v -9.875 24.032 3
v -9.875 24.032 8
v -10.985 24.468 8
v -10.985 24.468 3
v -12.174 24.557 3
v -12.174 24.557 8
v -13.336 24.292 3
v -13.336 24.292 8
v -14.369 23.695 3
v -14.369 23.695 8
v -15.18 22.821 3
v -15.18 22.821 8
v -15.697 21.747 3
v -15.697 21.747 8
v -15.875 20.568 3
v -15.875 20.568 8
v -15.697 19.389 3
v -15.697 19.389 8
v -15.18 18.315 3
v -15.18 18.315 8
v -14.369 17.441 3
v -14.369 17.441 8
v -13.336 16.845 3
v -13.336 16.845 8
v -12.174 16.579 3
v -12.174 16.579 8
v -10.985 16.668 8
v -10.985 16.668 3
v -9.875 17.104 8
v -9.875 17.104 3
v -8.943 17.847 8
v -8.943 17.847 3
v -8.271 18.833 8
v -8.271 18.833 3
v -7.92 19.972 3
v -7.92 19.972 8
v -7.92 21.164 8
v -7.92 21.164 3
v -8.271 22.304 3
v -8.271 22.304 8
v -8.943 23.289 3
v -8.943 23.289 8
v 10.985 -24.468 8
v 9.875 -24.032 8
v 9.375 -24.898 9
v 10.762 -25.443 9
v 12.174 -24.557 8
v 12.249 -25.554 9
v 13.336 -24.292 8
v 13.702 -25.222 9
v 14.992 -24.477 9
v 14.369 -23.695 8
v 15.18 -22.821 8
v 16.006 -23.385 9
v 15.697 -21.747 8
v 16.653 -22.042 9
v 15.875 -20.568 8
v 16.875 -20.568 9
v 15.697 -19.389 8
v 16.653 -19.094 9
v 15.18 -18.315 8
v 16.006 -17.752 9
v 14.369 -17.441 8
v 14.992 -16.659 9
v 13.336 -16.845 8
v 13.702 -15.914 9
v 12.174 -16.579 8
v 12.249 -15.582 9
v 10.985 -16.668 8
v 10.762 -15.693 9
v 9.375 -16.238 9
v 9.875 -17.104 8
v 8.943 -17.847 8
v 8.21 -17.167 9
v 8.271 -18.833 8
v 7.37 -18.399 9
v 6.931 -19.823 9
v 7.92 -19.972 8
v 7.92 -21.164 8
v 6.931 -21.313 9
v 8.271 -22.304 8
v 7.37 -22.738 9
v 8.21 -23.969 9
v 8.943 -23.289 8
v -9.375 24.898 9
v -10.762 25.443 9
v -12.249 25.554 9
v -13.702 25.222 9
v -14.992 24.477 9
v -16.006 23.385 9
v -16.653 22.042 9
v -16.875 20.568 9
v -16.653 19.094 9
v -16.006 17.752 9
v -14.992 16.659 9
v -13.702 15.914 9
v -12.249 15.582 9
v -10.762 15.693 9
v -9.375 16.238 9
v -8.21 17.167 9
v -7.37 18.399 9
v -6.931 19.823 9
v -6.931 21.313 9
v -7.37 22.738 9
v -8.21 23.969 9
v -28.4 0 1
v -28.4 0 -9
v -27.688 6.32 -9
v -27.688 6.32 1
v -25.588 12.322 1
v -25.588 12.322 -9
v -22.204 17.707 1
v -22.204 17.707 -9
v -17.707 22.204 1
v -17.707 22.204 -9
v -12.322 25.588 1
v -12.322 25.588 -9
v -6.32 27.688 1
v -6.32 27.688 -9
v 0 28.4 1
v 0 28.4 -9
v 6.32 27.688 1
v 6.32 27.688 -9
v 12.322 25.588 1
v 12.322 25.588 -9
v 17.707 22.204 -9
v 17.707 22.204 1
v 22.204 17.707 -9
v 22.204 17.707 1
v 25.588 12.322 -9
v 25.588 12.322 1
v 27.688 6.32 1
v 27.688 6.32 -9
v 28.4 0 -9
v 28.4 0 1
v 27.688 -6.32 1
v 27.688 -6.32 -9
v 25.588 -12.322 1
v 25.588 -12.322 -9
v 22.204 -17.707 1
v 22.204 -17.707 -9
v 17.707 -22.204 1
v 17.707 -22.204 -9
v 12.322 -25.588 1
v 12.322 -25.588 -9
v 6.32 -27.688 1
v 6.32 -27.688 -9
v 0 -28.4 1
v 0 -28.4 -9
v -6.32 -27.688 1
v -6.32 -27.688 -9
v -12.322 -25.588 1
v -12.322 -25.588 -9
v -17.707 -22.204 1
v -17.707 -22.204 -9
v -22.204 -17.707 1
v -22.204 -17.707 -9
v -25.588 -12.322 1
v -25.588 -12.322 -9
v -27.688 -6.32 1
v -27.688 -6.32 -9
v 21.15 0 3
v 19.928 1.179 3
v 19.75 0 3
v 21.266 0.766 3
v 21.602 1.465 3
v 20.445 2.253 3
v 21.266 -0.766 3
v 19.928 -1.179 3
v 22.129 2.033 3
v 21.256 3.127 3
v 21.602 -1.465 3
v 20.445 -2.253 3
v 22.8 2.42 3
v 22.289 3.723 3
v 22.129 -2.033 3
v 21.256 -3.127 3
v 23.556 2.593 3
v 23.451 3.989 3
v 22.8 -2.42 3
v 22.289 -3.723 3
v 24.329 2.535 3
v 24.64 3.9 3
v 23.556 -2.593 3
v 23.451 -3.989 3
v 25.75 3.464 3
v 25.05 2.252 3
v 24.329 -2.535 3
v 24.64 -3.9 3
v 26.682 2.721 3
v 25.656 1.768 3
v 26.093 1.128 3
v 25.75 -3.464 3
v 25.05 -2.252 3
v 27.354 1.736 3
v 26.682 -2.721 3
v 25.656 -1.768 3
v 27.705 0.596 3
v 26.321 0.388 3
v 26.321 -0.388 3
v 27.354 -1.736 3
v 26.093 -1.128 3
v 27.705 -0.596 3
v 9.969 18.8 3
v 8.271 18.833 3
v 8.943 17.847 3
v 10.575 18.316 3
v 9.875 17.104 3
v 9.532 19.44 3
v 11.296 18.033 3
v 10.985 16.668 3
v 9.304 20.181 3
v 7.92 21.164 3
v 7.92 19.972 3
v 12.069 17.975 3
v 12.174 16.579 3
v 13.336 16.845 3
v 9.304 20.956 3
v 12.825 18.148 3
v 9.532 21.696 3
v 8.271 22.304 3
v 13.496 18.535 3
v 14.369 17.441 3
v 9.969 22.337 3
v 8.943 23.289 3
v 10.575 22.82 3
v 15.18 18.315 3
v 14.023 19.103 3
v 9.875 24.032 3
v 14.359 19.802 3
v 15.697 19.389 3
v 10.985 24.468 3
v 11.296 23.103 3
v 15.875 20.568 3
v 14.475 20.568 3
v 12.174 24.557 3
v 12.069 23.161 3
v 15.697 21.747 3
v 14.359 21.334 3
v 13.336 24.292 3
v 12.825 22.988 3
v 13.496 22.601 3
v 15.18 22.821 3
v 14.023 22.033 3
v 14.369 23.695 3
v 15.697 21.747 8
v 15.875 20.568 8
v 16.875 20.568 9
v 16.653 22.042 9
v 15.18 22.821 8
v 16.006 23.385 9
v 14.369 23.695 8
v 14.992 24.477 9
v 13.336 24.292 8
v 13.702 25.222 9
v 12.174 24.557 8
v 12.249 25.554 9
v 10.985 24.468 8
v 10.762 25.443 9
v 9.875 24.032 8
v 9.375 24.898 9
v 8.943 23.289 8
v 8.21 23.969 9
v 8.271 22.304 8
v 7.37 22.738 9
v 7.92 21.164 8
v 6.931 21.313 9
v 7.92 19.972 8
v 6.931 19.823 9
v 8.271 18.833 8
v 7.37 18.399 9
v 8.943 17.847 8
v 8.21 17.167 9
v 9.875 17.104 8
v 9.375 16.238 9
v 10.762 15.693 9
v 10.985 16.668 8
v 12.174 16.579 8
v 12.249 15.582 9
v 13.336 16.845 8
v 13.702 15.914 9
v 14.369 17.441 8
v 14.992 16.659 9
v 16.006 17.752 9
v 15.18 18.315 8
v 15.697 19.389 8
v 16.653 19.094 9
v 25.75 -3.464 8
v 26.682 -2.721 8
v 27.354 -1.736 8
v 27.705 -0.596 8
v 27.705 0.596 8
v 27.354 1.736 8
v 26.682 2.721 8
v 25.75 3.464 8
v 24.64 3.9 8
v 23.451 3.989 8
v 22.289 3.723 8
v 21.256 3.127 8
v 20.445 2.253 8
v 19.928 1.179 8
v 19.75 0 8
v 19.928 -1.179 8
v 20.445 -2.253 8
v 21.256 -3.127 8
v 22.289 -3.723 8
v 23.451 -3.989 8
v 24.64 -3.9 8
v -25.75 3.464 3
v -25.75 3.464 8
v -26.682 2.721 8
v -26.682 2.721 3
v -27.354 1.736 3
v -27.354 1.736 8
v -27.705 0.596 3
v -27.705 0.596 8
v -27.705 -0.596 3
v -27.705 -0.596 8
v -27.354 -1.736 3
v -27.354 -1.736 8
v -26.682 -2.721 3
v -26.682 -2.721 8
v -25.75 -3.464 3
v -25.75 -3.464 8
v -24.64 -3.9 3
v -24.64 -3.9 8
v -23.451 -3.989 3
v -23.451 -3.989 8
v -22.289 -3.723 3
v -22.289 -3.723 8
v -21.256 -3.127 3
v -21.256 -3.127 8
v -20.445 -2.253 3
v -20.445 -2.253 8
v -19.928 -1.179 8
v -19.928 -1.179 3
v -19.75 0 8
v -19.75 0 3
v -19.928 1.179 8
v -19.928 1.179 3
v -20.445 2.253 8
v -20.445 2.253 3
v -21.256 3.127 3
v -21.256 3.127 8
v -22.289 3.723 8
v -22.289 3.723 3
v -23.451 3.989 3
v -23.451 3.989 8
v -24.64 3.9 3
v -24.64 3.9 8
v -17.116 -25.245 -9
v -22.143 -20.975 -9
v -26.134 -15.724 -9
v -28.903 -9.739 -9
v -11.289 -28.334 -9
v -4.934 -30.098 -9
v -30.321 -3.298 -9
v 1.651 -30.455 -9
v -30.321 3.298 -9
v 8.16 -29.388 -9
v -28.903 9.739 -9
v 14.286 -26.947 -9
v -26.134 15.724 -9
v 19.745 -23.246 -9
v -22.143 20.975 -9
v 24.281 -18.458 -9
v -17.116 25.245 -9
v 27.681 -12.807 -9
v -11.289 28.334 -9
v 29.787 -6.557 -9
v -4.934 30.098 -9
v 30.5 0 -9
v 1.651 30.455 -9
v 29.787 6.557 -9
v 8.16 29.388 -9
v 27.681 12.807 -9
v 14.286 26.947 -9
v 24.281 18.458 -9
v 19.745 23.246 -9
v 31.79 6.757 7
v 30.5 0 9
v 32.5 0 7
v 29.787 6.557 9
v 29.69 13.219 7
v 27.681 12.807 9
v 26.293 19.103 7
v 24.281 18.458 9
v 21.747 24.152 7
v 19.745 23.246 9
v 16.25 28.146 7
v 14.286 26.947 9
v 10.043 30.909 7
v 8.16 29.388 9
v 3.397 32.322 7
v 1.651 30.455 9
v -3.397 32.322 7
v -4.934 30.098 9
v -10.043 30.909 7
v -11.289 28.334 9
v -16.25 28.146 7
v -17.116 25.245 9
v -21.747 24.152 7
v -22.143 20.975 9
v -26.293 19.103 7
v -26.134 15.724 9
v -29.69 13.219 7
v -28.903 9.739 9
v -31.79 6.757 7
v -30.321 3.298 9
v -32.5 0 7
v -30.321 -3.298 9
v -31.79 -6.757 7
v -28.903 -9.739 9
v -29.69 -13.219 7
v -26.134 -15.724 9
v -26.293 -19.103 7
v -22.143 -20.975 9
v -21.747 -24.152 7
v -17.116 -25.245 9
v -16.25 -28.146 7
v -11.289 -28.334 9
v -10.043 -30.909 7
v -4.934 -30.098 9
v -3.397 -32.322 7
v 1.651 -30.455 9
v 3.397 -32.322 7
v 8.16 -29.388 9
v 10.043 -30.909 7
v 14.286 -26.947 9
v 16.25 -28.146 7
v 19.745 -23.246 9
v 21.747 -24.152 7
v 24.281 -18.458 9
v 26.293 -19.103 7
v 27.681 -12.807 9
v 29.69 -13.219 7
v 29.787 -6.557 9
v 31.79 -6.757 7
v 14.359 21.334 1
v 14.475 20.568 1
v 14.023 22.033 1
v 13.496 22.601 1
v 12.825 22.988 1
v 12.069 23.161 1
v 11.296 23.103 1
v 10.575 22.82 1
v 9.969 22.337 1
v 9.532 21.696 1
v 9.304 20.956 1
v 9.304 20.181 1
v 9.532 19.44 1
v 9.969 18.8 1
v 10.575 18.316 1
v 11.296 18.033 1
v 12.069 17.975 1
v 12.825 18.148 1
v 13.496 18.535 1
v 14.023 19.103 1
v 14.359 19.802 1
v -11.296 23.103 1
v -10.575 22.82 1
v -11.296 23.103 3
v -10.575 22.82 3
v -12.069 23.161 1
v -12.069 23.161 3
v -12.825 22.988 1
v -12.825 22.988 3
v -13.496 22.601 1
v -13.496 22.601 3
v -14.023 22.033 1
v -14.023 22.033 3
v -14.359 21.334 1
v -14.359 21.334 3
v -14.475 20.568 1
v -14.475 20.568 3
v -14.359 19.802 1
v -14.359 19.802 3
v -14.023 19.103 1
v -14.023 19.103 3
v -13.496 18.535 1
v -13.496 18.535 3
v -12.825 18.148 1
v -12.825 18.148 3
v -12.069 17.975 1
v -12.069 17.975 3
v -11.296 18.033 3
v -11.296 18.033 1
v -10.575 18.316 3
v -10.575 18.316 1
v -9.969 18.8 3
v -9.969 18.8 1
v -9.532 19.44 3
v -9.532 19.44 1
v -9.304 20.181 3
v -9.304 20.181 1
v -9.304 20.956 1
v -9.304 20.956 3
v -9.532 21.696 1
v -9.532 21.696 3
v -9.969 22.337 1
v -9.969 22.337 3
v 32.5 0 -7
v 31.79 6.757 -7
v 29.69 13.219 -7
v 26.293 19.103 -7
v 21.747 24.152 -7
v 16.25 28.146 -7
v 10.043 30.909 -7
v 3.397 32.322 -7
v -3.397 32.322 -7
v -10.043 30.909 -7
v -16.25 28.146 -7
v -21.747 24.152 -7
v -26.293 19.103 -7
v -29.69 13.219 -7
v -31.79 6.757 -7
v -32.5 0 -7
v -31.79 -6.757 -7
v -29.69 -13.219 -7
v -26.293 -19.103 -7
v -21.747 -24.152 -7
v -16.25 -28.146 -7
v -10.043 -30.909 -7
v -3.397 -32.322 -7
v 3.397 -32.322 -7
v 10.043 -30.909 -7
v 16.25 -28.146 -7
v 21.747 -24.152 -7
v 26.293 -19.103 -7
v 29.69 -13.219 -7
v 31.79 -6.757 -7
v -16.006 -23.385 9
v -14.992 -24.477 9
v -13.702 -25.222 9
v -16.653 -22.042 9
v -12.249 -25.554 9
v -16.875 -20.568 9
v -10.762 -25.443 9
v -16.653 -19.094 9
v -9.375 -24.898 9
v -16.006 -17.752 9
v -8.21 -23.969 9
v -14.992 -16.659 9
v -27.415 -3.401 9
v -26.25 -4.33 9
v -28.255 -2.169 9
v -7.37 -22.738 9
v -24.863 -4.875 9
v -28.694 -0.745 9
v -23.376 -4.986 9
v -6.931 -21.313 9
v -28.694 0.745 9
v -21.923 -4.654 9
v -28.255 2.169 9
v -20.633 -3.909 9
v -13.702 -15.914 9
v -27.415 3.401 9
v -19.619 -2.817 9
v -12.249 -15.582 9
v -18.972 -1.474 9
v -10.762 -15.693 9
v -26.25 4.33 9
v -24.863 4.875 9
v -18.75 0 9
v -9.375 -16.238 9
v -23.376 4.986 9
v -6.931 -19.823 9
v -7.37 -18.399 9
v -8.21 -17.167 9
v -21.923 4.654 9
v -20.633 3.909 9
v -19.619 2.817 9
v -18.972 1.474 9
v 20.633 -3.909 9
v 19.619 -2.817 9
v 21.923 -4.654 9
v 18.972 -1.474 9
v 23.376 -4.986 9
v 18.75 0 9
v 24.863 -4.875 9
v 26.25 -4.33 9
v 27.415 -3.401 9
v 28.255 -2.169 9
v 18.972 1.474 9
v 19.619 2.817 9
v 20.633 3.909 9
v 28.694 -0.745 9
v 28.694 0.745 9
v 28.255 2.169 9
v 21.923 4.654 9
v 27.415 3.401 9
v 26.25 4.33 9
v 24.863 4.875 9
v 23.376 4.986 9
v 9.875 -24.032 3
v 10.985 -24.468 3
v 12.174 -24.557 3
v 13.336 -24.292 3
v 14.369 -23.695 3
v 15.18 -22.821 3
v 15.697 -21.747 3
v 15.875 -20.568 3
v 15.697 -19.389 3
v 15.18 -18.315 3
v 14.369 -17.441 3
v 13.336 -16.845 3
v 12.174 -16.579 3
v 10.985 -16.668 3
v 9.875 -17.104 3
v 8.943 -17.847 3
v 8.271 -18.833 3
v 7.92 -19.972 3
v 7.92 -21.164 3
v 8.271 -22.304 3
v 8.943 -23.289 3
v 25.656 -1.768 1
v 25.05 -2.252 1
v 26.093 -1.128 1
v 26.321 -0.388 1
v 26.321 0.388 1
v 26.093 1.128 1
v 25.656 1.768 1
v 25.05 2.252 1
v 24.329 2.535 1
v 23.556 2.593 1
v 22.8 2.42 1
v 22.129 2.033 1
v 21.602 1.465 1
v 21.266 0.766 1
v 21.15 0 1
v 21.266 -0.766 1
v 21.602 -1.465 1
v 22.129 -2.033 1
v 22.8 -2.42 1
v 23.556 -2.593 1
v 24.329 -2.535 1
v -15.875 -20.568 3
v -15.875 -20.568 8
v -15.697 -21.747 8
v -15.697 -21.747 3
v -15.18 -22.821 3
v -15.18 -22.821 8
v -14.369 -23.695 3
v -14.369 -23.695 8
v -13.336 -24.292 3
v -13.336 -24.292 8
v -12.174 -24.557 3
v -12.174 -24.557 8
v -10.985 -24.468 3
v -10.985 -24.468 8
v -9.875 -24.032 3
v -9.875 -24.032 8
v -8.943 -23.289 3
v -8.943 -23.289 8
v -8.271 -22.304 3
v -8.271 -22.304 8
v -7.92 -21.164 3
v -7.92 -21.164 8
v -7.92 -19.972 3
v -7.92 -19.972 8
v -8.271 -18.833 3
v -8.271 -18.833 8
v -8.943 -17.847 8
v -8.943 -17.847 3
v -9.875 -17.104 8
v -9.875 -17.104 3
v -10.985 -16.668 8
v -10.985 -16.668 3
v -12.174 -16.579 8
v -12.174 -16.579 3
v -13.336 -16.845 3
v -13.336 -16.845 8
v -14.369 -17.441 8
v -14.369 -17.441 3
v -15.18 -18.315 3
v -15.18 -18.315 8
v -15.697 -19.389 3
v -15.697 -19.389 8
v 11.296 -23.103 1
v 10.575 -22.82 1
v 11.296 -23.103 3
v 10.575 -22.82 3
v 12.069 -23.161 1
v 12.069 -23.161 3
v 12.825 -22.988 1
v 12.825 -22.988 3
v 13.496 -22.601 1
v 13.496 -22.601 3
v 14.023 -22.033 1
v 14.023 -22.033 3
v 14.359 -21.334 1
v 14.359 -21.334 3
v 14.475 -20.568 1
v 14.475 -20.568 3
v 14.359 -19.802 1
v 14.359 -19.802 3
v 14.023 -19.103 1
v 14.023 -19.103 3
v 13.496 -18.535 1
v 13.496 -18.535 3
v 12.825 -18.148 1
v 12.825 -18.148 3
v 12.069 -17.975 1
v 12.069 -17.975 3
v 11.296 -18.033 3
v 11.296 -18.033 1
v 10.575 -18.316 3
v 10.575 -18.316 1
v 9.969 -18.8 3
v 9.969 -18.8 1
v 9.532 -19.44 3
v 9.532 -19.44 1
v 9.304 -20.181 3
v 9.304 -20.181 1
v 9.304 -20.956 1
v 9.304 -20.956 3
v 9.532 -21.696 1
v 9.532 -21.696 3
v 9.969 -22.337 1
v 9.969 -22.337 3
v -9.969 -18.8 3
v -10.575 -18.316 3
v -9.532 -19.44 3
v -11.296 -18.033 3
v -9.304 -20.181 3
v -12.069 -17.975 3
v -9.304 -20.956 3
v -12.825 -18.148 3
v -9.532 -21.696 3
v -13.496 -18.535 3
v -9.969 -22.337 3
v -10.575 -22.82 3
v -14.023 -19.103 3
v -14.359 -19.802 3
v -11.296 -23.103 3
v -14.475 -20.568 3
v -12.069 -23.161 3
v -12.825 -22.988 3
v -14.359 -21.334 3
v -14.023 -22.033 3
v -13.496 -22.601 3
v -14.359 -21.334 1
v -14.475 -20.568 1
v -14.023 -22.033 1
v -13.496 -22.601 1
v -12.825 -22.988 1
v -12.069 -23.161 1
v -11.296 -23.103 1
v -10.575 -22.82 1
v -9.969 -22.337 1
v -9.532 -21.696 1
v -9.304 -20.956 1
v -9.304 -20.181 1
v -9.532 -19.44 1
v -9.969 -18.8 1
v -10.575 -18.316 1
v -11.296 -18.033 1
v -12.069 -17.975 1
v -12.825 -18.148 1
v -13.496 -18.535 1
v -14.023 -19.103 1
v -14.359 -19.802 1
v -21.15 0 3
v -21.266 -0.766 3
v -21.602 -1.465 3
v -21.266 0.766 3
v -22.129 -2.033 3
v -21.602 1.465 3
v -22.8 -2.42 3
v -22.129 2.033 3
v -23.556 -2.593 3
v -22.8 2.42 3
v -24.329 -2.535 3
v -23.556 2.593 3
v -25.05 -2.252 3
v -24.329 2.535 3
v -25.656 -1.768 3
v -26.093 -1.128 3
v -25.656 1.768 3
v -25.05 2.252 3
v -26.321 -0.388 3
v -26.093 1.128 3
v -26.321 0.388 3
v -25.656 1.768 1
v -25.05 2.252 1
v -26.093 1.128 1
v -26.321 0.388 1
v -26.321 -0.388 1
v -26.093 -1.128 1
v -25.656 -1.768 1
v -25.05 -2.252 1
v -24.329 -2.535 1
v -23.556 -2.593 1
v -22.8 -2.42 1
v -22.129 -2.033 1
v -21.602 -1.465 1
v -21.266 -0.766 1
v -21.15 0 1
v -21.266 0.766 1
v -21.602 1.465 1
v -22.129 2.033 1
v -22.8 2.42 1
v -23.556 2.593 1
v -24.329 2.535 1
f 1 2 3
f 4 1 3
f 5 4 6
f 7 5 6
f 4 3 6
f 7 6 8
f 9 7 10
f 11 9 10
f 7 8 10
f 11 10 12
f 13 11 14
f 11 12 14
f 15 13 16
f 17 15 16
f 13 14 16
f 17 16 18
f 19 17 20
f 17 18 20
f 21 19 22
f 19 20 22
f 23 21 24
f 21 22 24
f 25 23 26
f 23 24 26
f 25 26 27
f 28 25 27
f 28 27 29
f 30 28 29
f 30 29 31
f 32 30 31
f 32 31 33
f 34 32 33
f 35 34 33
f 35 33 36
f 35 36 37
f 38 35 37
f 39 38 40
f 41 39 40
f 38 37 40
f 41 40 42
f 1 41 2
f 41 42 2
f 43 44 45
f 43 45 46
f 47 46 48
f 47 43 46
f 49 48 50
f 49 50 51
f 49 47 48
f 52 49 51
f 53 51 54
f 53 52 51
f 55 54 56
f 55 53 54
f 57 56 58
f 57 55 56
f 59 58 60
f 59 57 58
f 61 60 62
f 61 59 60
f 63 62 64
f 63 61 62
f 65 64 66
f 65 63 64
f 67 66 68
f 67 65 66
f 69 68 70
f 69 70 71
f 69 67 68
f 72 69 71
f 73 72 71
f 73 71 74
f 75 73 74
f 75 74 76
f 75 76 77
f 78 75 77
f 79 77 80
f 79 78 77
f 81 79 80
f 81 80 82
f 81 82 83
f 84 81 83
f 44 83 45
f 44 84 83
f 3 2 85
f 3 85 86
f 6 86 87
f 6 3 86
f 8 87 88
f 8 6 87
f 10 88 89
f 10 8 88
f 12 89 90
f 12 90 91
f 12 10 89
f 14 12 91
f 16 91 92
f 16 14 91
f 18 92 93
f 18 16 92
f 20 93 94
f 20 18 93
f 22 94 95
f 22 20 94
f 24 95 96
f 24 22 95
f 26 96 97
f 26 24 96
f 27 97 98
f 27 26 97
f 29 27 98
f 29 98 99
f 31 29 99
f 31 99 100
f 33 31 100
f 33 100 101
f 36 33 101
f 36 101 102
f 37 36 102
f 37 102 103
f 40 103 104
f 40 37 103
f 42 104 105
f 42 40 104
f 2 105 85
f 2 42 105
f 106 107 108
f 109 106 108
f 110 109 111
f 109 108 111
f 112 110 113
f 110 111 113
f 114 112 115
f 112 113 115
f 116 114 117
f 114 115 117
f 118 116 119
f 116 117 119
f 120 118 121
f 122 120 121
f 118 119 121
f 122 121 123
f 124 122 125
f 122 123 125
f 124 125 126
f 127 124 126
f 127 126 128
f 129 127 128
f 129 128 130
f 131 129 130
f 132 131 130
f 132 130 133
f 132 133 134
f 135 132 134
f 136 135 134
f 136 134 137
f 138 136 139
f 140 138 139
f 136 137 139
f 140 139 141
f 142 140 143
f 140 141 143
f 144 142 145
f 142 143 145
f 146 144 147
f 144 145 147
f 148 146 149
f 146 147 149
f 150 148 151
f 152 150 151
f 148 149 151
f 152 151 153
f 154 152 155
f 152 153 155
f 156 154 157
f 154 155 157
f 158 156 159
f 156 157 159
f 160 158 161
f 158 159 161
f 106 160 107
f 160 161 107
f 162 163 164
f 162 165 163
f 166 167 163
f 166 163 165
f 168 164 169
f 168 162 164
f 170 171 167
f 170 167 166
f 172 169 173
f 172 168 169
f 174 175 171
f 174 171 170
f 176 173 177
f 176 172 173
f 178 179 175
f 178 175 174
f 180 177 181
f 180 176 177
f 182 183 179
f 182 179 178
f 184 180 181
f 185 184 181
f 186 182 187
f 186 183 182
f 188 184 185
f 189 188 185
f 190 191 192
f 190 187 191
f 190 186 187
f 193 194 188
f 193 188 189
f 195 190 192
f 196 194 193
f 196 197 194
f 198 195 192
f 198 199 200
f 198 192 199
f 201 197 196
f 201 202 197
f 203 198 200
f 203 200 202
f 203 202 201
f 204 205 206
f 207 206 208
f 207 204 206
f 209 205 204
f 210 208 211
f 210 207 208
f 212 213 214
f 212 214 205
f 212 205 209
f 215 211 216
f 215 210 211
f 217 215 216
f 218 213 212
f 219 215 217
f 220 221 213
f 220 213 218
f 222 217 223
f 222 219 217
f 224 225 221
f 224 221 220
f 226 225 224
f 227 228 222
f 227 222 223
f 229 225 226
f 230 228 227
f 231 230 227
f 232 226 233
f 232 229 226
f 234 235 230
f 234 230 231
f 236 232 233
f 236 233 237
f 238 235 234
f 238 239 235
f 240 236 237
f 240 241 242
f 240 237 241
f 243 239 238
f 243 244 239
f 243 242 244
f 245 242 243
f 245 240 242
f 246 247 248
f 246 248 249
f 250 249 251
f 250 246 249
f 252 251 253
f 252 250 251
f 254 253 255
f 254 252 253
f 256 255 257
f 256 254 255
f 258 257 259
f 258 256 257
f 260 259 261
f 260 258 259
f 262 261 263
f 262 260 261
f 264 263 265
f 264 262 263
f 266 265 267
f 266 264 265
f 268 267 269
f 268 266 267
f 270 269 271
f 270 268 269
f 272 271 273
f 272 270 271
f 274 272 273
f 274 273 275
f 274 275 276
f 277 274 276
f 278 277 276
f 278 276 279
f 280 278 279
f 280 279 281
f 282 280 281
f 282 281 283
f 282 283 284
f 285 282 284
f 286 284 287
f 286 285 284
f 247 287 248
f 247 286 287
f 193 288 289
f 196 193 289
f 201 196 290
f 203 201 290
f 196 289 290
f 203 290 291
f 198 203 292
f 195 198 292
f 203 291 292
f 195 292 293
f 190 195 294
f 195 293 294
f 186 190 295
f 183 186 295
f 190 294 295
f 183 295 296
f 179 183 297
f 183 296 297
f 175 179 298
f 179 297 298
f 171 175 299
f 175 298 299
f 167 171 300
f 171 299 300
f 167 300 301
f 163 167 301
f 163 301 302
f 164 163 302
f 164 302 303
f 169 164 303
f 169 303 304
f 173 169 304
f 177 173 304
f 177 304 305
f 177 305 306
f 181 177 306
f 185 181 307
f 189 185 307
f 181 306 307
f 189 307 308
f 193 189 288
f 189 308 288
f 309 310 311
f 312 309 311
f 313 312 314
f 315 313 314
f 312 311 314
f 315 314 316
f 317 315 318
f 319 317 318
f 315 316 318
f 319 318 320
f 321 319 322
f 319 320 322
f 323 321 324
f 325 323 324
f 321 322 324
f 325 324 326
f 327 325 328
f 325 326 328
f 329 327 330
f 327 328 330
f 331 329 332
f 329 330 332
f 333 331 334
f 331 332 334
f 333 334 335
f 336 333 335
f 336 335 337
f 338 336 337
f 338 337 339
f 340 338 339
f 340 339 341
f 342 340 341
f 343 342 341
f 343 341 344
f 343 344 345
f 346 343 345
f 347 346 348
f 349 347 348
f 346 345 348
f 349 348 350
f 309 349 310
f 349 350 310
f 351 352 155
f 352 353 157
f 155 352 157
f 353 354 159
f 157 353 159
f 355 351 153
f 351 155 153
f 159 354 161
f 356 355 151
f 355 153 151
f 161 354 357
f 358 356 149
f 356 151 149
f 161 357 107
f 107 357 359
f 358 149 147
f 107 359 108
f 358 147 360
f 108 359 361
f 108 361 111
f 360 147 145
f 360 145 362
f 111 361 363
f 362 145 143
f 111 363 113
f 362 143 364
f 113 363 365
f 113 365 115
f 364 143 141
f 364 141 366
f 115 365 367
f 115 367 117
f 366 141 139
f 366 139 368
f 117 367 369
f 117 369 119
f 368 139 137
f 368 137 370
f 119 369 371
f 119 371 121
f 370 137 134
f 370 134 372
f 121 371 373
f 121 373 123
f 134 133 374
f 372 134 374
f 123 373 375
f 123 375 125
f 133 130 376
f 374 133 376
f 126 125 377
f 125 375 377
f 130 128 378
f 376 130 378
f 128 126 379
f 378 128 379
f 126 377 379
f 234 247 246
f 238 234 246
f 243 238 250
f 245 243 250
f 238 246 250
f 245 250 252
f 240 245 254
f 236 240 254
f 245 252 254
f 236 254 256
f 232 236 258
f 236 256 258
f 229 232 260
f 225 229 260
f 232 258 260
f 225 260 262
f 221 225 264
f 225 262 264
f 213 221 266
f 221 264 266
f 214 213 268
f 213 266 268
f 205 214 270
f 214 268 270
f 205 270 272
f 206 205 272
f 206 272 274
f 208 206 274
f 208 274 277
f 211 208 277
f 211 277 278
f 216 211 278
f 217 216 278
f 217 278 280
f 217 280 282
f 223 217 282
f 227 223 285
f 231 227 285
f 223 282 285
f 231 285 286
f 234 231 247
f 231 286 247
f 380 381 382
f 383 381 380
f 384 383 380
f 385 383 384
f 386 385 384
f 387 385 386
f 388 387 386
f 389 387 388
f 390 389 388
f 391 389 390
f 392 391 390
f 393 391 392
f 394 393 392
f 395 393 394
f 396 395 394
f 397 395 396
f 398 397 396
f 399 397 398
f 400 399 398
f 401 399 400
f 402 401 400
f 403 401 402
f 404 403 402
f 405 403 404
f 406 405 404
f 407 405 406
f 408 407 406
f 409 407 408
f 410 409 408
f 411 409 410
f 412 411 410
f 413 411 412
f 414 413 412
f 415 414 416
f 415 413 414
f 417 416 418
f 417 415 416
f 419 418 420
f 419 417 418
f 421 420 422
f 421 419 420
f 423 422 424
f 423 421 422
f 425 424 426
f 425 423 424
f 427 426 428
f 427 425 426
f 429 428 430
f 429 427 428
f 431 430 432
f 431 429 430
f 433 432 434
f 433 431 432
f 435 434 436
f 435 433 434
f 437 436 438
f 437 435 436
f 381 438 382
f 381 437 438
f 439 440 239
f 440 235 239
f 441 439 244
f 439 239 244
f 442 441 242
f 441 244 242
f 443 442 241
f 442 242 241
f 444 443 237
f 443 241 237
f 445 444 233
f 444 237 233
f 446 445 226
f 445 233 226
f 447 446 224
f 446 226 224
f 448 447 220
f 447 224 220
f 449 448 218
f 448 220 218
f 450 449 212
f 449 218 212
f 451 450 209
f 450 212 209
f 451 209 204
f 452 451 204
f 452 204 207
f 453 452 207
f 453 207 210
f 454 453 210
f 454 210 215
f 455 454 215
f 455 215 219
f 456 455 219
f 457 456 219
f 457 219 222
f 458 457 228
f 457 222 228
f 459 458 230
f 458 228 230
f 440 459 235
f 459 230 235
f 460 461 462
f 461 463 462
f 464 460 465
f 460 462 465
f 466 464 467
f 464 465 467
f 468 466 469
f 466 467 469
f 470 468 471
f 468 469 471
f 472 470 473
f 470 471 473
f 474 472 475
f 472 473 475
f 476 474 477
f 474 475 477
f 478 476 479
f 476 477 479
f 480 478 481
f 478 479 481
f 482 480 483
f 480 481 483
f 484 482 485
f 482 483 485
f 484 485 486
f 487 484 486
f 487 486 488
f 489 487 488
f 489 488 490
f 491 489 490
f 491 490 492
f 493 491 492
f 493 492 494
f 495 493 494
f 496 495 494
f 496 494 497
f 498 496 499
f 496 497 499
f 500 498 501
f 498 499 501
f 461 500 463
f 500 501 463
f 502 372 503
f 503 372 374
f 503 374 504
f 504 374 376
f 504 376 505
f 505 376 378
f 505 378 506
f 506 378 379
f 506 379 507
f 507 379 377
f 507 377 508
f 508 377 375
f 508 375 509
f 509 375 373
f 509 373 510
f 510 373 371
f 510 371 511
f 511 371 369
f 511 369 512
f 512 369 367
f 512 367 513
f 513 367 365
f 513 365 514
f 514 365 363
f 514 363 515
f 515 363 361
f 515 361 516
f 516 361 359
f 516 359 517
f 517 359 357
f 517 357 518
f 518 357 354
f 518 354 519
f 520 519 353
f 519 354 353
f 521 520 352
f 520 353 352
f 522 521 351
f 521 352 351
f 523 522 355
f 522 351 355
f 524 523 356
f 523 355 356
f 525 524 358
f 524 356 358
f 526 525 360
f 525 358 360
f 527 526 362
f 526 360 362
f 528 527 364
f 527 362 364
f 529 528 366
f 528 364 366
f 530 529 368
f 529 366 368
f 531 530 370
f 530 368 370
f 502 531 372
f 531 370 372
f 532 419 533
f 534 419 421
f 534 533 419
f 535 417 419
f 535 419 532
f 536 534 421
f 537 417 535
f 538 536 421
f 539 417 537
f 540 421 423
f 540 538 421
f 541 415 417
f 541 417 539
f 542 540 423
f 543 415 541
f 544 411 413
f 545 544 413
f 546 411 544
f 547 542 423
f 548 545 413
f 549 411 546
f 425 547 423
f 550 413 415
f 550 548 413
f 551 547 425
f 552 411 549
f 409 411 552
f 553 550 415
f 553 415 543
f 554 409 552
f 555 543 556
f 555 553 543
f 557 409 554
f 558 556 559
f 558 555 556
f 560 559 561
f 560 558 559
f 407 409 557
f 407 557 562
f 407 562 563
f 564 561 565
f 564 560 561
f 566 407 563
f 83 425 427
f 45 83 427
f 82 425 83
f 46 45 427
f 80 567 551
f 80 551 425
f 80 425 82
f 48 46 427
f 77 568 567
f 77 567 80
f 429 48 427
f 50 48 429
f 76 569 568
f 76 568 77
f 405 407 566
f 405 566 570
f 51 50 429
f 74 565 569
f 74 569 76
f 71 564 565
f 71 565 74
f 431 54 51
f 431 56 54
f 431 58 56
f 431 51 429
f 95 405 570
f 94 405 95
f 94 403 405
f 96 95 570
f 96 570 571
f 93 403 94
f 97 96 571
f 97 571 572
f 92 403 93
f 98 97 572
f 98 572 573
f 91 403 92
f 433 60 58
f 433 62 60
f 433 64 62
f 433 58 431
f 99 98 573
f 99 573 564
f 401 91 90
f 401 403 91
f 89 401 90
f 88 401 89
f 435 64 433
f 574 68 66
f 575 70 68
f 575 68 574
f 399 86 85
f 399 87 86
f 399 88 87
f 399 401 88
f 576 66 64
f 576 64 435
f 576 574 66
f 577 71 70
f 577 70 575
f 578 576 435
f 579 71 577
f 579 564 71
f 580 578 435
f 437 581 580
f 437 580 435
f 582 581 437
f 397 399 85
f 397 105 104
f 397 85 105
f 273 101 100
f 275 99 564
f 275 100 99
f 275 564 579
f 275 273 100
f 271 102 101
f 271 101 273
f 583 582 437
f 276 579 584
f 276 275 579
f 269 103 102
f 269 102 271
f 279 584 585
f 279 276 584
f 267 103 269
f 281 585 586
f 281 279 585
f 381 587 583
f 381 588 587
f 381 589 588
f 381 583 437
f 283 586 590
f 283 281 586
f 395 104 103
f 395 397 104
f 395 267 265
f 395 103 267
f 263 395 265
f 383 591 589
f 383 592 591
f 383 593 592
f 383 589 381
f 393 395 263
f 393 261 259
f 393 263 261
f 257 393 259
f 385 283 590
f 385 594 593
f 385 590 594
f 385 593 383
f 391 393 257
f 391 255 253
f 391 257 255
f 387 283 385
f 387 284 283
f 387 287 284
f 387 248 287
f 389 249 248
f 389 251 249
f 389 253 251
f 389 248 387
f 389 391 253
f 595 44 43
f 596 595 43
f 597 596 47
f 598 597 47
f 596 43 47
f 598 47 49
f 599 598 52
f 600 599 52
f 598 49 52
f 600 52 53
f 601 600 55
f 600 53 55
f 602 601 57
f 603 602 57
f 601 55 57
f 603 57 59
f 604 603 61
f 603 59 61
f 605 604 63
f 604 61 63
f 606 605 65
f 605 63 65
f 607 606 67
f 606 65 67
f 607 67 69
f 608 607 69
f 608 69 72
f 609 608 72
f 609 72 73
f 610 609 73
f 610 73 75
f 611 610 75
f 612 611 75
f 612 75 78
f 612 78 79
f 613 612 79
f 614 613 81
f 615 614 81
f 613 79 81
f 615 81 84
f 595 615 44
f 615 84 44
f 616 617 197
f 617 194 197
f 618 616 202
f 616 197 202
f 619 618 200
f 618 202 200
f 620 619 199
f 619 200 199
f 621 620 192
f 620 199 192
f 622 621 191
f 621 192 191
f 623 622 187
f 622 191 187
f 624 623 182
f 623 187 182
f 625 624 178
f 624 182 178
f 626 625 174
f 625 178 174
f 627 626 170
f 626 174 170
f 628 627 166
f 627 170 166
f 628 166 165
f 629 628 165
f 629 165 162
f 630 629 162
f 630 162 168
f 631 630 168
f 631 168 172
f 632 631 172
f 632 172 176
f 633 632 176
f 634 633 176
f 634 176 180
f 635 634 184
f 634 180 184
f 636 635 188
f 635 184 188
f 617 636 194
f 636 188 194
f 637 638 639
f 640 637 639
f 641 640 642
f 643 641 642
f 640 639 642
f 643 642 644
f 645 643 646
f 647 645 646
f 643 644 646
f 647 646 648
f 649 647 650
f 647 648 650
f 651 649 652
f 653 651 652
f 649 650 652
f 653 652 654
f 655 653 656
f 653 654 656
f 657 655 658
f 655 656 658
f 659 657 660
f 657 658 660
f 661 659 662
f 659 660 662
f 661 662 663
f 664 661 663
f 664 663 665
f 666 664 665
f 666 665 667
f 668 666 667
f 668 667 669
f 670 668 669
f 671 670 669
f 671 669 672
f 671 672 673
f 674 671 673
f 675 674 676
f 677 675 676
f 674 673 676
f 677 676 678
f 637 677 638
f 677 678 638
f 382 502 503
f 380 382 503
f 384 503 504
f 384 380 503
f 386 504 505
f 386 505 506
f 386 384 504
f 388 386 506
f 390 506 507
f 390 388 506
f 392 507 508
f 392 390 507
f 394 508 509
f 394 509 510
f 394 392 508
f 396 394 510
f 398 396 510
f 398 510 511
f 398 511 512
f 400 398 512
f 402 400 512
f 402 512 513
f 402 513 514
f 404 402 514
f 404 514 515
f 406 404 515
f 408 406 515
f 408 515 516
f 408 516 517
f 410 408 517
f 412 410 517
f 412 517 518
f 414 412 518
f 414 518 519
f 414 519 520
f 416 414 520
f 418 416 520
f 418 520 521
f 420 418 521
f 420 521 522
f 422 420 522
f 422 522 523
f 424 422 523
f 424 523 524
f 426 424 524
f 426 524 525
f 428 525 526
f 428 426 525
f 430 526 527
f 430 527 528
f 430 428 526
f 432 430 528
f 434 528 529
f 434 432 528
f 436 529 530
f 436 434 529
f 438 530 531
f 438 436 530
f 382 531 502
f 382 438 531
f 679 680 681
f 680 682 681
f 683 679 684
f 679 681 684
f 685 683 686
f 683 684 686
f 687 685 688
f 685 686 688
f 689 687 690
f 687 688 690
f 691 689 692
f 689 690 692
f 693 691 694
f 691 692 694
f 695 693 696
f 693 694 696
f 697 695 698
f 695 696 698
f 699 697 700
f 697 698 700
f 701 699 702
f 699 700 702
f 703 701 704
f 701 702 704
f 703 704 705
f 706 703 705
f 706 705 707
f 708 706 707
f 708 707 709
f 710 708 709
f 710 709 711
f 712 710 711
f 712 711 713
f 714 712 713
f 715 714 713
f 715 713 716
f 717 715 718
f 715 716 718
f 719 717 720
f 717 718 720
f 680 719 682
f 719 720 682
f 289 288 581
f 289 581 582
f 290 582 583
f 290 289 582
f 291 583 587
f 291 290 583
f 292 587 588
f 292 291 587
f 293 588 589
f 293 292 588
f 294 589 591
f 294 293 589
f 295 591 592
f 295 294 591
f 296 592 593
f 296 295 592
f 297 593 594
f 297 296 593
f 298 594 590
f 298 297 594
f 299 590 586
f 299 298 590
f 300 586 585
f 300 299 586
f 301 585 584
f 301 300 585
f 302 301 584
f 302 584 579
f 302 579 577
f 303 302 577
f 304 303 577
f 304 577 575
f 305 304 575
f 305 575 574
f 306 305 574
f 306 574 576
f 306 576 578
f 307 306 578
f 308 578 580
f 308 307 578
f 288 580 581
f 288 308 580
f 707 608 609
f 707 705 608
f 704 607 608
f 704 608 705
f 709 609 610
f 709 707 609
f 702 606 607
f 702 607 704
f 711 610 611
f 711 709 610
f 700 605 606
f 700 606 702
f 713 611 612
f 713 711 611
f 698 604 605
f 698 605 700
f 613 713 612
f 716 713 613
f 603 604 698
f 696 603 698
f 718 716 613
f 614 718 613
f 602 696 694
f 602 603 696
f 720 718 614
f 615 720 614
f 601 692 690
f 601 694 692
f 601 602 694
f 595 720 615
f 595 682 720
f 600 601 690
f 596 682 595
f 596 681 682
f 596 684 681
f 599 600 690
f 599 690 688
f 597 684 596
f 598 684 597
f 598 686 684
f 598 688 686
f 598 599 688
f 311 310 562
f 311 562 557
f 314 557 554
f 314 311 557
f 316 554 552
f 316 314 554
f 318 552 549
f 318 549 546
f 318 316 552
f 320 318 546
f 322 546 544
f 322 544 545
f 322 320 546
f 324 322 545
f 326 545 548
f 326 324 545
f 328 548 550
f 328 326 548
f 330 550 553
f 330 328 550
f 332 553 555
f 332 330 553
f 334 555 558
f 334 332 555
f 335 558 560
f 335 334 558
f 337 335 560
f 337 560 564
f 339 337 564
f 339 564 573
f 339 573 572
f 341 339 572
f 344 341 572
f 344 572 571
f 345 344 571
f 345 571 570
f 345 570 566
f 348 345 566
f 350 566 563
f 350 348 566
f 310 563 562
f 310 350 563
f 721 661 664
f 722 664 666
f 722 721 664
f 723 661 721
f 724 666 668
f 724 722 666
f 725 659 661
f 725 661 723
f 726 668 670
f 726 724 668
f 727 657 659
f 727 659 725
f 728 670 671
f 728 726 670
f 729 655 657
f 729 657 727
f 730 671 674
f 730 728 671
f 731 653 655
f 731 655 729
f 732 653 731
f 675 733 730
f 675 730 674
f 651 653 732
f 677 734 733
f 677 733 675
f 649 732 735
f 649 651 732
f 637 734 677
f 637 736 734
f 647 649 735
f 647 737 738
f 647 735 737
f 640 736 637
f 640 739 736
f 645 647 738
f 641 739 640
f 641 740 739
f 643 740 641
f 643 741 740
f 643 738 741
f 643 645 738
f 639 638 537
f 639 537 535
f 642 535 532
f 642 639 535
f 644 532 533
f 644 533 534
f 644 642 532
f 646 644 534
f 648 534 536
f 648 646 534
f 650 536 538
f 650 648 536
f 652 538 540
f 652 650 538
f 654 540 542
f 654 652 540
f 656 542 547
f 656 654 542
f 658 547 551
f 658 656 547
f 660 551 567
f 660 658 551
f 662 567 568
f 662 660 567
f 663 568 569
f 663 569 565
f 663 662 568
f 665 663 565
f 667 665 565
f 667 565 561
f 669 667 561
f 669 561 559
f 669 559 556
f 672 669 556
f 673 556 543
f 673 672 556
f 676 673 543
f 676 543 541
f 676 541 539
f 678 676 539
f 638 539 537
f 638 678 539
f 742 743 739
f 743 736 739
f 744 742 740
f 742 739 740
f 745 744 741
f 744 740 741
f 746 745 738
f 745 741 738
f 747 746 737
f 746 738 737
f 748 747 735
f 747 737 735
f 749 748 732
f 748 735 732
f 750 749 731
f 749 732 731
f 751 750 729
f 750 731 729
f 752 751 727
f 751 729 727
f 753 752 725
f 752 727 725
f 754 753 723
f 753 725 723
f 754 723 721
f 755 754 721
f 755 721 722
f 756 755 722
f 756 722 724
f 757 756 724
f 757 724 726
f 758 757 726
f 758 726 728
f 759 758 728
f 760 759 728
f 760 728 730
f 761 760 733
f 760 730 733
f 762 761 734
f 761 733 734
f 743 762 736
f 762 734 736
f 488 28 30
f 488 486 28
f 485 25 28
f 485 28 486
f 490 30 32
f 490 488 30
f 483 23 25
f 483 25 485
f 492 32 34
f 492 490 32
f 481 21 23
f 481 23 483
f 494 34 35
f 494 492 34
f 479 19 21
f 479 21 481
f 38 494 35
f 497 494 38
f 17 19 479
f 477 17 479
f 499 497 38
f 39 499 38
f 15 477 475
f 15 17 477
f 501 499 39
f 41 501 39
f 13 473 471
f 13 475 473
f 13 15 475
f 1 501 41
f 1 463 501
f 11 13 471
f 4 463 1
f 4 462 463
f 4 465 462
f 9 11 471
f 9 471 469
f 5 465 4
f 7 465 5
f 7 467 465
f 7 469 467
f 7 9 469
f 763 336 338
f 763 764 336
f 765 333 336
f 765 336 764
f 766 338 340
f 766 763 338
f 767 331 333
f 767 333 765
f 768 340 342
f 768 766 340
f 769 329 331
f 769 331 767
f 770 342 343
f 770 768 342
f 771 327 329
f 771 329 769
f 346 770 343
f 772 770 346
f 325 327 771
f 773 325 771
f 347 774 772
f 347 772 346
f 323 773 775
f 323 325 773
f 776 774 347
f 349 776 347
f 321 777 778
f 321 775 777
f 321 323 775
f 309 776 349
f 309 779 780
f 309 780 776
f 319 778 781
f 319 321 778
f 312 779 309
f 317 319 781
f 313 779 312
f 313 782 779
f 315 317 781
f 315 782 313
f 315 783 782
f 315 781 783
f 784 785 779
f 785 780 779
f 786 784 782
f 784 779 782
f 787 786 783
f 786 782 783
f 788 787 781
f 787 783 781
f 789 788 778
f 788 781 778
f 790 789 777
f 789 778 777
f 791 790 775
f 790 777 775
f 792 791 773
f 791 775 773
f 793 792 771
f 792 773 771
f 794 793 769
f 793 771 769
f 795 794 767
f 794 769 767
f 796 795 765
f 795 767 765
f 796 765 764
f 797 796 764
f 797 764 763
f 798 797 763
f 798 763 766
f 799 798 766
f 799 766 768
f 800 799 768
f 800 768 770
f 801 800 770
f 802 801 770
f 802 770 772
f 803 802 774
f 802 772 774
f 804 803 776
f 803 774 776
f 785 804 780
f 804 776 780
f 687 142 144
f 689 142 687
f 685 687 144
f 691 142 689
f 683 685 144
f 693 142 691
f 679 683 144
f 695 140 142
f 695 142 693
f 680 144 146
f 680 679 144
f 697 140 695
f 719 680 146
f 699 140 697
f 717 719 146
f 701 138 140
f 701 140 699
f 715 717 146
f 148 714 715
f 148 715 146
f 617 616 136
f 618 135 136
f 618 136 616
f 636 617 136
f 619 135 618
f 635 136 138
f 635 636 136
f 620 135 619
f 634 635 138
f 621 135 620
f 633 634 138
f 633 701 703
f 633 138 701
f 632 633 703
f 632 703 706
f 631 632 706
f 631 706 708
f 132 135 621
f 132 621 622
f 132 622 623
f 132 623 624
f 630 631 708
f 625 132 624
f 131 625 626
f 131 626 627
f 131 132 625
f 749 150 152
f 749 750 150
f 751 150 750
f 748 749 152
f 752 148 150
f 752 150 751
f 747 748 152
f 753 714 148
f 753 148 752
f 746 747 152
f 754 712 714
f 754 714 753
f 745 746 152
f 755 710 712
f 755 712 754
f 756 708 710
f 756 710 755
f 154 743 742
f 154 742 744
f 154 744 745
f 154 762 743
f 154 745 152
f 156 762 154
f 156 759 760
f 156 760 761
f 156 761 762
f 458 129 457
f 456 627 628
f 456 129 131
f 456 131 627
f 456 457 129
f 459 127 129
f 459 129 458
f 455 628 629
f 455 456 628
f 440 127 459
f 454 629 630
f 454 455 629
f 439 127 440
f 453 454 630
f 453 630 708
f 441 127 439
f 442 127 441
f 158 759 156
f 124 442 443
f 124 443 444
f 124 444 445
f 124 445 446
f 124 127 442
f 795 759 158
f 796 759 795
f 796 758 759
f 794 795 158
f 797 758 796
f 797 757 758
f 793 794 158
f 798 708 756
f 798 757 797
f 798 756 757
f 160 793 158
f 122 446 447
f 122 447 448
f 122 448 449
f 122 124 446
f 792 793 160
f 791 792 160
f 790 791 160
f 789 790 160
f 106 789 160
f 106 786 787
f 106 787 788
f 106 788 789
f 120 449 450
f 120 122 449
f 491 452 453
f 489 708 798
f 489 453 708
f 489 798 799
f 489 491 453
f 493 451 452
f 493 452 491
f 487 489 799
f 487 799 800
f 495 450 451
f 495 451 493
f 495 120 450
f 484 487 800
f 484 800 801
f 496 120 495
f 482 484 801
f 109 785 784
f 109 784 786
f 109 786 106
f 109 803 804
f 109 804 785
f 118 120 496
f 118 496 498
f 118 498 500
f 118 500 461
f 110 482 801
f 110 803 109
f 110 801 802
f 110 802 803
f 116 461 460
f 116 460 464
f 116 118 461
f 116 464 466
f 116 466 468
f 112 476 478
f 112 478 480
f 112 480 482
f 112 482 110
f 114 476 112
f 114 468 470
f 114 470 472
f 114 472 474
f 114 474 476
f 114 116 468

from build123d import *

# Parameters (mm, degrees)
SKETCH_1_R                           = 32.5
EXTRUDE_1_DEPTH                      = 9
CHAMFER_1_SIZE                       = 2
SKETCH_3_R                           = 2.6
CUT_EXTRUDE_1_DEPTH                  = 47.834816109
CUT_EXTRUDE_START                    = 9
SKETCH_4_R                           = 4
CUT_EXTRUDE_2_DEPTH                  = 6
CHAMFER_2_SIZE                       = 1
PATTERN_CIRCULAR_1_COUNT             = 6
CHAMFER_2_OF_PATTERN_CIRCULAR_1_SIZE = 1
SKETCH_5_R                           = 28.4
CUT_EXTRUDE_3_DEPTH                  = 10


with BuildPart() as part:
    # ｽｹｯﾁ1 → ﾎﾞｽ - 押し出し1 (new, symmetric)
    with BuildSketch(Plane.XY):
        Circle(SKETCH_1_R)
    extrude(amount=EXTRUDE_1_DEPTH, both=True)

    # 面取り1
    chamfer_1_edges = [part.edges().sort_by_distance(p)[0] for p in [
        (-32.5, 0, -9),
        (-32.5, 0, 9),
    ]]
    chamfer(chamfer_1_edges, length=CHAMFER_1_SIZE)

    # ｽｹｯﾁ3 → ｶｯﾄ - 押し出し1 (cut, symmetric)
    with BuildSketch(Plane.XY):
        with Locations((11.875, 20.56810334)):
            Circle(SKETCH_3_R)
    cut_extrude_1 = extrude(amount=CUT_EXTRUDE_1_DEPTH, both=True, mode=Mode.SUBTRACT)

    # ｽｹｯﾁ4 → ｶｯﾄ - 押し出し2 (cut)
    with BuildSketch(Plane.XY.offset(CUT_EXTRUDE_START)):
        with Locations((11.875, 20.56810334)):
            Circle(SKETCH_4_R)
    cut_extrude_2 = extrude(amount=-CUT_EXTRUDE_2_DEPTH, mode=Mode.SUBTRACT)

    # 面取り2
    chamfer_2_edges = [part.edges().sort_by_distance(p)[0] for p in [
        (7.875, 20.56810334, 9),
    ]]
    chamfer(chamfer_2_edges, length=CHAMFER_2_SIZE)

    # 円形ﾊﾟﾀｰﾝ1: ｶｯﾄ - 押し出し1, ｶｯﾄ - 押し出し2 ×6 about axis
    pattern_circular_1_axis = Axis((0, 0, 0), (0, 0, 1))
    add([cut_extrude_1.rotate(pattern_circular_1_axis, i * 360 / PATTERN_CIRCULAR_1_COUNT) for i in range(1, PATTERN_CIRCULAR_1_COUNT)], mode=Mode.SUBTRACT)
    add([cut_extrude_2.rotate(pattern_circular_1_axis, i * 360 / PATTERN_CIRCULAR_1_COUNT) for i in range(1, PATTERN_CIRCULAR_1_COUNT)], mode=Mode.SUBTRACT)

    # 面取り2 of 円形ﾊﾟﾀｰﾝ1
    chamfer_2_of_pattern_circular_1_edges = [part.edges().sort_by_distance(p)[0] for p in [
        (-13.875, 17.104001725, 9),
        (-21.75, -3.464101615, 9),
        (-7.875, -20.56810334, 9),
        (13.875, -17.104001725, 9),
        (21.75, 3.464101615, 9),
    ]]
    chamfer(chamfer_2_of_pattern_circular_1_edges, length=CHAMFER_2_OF_PATTERN_CIRCULAR_1_SIZE)

    # ｽｹｯﾁ5 → ｶｯﾄ - 押し出し3 (cut)
    with BuildSketch(Plane(origin=(0, 0, -9), x_dir=(-1, 0, 0), z_dir=(0, 0, -1))):
        Circle(SKETCH_5_R)
    extrude(amount=-CUT_EXTRUDE_3_DEPTH, mode=Mode.SUBTRACT)


solid = part.part
